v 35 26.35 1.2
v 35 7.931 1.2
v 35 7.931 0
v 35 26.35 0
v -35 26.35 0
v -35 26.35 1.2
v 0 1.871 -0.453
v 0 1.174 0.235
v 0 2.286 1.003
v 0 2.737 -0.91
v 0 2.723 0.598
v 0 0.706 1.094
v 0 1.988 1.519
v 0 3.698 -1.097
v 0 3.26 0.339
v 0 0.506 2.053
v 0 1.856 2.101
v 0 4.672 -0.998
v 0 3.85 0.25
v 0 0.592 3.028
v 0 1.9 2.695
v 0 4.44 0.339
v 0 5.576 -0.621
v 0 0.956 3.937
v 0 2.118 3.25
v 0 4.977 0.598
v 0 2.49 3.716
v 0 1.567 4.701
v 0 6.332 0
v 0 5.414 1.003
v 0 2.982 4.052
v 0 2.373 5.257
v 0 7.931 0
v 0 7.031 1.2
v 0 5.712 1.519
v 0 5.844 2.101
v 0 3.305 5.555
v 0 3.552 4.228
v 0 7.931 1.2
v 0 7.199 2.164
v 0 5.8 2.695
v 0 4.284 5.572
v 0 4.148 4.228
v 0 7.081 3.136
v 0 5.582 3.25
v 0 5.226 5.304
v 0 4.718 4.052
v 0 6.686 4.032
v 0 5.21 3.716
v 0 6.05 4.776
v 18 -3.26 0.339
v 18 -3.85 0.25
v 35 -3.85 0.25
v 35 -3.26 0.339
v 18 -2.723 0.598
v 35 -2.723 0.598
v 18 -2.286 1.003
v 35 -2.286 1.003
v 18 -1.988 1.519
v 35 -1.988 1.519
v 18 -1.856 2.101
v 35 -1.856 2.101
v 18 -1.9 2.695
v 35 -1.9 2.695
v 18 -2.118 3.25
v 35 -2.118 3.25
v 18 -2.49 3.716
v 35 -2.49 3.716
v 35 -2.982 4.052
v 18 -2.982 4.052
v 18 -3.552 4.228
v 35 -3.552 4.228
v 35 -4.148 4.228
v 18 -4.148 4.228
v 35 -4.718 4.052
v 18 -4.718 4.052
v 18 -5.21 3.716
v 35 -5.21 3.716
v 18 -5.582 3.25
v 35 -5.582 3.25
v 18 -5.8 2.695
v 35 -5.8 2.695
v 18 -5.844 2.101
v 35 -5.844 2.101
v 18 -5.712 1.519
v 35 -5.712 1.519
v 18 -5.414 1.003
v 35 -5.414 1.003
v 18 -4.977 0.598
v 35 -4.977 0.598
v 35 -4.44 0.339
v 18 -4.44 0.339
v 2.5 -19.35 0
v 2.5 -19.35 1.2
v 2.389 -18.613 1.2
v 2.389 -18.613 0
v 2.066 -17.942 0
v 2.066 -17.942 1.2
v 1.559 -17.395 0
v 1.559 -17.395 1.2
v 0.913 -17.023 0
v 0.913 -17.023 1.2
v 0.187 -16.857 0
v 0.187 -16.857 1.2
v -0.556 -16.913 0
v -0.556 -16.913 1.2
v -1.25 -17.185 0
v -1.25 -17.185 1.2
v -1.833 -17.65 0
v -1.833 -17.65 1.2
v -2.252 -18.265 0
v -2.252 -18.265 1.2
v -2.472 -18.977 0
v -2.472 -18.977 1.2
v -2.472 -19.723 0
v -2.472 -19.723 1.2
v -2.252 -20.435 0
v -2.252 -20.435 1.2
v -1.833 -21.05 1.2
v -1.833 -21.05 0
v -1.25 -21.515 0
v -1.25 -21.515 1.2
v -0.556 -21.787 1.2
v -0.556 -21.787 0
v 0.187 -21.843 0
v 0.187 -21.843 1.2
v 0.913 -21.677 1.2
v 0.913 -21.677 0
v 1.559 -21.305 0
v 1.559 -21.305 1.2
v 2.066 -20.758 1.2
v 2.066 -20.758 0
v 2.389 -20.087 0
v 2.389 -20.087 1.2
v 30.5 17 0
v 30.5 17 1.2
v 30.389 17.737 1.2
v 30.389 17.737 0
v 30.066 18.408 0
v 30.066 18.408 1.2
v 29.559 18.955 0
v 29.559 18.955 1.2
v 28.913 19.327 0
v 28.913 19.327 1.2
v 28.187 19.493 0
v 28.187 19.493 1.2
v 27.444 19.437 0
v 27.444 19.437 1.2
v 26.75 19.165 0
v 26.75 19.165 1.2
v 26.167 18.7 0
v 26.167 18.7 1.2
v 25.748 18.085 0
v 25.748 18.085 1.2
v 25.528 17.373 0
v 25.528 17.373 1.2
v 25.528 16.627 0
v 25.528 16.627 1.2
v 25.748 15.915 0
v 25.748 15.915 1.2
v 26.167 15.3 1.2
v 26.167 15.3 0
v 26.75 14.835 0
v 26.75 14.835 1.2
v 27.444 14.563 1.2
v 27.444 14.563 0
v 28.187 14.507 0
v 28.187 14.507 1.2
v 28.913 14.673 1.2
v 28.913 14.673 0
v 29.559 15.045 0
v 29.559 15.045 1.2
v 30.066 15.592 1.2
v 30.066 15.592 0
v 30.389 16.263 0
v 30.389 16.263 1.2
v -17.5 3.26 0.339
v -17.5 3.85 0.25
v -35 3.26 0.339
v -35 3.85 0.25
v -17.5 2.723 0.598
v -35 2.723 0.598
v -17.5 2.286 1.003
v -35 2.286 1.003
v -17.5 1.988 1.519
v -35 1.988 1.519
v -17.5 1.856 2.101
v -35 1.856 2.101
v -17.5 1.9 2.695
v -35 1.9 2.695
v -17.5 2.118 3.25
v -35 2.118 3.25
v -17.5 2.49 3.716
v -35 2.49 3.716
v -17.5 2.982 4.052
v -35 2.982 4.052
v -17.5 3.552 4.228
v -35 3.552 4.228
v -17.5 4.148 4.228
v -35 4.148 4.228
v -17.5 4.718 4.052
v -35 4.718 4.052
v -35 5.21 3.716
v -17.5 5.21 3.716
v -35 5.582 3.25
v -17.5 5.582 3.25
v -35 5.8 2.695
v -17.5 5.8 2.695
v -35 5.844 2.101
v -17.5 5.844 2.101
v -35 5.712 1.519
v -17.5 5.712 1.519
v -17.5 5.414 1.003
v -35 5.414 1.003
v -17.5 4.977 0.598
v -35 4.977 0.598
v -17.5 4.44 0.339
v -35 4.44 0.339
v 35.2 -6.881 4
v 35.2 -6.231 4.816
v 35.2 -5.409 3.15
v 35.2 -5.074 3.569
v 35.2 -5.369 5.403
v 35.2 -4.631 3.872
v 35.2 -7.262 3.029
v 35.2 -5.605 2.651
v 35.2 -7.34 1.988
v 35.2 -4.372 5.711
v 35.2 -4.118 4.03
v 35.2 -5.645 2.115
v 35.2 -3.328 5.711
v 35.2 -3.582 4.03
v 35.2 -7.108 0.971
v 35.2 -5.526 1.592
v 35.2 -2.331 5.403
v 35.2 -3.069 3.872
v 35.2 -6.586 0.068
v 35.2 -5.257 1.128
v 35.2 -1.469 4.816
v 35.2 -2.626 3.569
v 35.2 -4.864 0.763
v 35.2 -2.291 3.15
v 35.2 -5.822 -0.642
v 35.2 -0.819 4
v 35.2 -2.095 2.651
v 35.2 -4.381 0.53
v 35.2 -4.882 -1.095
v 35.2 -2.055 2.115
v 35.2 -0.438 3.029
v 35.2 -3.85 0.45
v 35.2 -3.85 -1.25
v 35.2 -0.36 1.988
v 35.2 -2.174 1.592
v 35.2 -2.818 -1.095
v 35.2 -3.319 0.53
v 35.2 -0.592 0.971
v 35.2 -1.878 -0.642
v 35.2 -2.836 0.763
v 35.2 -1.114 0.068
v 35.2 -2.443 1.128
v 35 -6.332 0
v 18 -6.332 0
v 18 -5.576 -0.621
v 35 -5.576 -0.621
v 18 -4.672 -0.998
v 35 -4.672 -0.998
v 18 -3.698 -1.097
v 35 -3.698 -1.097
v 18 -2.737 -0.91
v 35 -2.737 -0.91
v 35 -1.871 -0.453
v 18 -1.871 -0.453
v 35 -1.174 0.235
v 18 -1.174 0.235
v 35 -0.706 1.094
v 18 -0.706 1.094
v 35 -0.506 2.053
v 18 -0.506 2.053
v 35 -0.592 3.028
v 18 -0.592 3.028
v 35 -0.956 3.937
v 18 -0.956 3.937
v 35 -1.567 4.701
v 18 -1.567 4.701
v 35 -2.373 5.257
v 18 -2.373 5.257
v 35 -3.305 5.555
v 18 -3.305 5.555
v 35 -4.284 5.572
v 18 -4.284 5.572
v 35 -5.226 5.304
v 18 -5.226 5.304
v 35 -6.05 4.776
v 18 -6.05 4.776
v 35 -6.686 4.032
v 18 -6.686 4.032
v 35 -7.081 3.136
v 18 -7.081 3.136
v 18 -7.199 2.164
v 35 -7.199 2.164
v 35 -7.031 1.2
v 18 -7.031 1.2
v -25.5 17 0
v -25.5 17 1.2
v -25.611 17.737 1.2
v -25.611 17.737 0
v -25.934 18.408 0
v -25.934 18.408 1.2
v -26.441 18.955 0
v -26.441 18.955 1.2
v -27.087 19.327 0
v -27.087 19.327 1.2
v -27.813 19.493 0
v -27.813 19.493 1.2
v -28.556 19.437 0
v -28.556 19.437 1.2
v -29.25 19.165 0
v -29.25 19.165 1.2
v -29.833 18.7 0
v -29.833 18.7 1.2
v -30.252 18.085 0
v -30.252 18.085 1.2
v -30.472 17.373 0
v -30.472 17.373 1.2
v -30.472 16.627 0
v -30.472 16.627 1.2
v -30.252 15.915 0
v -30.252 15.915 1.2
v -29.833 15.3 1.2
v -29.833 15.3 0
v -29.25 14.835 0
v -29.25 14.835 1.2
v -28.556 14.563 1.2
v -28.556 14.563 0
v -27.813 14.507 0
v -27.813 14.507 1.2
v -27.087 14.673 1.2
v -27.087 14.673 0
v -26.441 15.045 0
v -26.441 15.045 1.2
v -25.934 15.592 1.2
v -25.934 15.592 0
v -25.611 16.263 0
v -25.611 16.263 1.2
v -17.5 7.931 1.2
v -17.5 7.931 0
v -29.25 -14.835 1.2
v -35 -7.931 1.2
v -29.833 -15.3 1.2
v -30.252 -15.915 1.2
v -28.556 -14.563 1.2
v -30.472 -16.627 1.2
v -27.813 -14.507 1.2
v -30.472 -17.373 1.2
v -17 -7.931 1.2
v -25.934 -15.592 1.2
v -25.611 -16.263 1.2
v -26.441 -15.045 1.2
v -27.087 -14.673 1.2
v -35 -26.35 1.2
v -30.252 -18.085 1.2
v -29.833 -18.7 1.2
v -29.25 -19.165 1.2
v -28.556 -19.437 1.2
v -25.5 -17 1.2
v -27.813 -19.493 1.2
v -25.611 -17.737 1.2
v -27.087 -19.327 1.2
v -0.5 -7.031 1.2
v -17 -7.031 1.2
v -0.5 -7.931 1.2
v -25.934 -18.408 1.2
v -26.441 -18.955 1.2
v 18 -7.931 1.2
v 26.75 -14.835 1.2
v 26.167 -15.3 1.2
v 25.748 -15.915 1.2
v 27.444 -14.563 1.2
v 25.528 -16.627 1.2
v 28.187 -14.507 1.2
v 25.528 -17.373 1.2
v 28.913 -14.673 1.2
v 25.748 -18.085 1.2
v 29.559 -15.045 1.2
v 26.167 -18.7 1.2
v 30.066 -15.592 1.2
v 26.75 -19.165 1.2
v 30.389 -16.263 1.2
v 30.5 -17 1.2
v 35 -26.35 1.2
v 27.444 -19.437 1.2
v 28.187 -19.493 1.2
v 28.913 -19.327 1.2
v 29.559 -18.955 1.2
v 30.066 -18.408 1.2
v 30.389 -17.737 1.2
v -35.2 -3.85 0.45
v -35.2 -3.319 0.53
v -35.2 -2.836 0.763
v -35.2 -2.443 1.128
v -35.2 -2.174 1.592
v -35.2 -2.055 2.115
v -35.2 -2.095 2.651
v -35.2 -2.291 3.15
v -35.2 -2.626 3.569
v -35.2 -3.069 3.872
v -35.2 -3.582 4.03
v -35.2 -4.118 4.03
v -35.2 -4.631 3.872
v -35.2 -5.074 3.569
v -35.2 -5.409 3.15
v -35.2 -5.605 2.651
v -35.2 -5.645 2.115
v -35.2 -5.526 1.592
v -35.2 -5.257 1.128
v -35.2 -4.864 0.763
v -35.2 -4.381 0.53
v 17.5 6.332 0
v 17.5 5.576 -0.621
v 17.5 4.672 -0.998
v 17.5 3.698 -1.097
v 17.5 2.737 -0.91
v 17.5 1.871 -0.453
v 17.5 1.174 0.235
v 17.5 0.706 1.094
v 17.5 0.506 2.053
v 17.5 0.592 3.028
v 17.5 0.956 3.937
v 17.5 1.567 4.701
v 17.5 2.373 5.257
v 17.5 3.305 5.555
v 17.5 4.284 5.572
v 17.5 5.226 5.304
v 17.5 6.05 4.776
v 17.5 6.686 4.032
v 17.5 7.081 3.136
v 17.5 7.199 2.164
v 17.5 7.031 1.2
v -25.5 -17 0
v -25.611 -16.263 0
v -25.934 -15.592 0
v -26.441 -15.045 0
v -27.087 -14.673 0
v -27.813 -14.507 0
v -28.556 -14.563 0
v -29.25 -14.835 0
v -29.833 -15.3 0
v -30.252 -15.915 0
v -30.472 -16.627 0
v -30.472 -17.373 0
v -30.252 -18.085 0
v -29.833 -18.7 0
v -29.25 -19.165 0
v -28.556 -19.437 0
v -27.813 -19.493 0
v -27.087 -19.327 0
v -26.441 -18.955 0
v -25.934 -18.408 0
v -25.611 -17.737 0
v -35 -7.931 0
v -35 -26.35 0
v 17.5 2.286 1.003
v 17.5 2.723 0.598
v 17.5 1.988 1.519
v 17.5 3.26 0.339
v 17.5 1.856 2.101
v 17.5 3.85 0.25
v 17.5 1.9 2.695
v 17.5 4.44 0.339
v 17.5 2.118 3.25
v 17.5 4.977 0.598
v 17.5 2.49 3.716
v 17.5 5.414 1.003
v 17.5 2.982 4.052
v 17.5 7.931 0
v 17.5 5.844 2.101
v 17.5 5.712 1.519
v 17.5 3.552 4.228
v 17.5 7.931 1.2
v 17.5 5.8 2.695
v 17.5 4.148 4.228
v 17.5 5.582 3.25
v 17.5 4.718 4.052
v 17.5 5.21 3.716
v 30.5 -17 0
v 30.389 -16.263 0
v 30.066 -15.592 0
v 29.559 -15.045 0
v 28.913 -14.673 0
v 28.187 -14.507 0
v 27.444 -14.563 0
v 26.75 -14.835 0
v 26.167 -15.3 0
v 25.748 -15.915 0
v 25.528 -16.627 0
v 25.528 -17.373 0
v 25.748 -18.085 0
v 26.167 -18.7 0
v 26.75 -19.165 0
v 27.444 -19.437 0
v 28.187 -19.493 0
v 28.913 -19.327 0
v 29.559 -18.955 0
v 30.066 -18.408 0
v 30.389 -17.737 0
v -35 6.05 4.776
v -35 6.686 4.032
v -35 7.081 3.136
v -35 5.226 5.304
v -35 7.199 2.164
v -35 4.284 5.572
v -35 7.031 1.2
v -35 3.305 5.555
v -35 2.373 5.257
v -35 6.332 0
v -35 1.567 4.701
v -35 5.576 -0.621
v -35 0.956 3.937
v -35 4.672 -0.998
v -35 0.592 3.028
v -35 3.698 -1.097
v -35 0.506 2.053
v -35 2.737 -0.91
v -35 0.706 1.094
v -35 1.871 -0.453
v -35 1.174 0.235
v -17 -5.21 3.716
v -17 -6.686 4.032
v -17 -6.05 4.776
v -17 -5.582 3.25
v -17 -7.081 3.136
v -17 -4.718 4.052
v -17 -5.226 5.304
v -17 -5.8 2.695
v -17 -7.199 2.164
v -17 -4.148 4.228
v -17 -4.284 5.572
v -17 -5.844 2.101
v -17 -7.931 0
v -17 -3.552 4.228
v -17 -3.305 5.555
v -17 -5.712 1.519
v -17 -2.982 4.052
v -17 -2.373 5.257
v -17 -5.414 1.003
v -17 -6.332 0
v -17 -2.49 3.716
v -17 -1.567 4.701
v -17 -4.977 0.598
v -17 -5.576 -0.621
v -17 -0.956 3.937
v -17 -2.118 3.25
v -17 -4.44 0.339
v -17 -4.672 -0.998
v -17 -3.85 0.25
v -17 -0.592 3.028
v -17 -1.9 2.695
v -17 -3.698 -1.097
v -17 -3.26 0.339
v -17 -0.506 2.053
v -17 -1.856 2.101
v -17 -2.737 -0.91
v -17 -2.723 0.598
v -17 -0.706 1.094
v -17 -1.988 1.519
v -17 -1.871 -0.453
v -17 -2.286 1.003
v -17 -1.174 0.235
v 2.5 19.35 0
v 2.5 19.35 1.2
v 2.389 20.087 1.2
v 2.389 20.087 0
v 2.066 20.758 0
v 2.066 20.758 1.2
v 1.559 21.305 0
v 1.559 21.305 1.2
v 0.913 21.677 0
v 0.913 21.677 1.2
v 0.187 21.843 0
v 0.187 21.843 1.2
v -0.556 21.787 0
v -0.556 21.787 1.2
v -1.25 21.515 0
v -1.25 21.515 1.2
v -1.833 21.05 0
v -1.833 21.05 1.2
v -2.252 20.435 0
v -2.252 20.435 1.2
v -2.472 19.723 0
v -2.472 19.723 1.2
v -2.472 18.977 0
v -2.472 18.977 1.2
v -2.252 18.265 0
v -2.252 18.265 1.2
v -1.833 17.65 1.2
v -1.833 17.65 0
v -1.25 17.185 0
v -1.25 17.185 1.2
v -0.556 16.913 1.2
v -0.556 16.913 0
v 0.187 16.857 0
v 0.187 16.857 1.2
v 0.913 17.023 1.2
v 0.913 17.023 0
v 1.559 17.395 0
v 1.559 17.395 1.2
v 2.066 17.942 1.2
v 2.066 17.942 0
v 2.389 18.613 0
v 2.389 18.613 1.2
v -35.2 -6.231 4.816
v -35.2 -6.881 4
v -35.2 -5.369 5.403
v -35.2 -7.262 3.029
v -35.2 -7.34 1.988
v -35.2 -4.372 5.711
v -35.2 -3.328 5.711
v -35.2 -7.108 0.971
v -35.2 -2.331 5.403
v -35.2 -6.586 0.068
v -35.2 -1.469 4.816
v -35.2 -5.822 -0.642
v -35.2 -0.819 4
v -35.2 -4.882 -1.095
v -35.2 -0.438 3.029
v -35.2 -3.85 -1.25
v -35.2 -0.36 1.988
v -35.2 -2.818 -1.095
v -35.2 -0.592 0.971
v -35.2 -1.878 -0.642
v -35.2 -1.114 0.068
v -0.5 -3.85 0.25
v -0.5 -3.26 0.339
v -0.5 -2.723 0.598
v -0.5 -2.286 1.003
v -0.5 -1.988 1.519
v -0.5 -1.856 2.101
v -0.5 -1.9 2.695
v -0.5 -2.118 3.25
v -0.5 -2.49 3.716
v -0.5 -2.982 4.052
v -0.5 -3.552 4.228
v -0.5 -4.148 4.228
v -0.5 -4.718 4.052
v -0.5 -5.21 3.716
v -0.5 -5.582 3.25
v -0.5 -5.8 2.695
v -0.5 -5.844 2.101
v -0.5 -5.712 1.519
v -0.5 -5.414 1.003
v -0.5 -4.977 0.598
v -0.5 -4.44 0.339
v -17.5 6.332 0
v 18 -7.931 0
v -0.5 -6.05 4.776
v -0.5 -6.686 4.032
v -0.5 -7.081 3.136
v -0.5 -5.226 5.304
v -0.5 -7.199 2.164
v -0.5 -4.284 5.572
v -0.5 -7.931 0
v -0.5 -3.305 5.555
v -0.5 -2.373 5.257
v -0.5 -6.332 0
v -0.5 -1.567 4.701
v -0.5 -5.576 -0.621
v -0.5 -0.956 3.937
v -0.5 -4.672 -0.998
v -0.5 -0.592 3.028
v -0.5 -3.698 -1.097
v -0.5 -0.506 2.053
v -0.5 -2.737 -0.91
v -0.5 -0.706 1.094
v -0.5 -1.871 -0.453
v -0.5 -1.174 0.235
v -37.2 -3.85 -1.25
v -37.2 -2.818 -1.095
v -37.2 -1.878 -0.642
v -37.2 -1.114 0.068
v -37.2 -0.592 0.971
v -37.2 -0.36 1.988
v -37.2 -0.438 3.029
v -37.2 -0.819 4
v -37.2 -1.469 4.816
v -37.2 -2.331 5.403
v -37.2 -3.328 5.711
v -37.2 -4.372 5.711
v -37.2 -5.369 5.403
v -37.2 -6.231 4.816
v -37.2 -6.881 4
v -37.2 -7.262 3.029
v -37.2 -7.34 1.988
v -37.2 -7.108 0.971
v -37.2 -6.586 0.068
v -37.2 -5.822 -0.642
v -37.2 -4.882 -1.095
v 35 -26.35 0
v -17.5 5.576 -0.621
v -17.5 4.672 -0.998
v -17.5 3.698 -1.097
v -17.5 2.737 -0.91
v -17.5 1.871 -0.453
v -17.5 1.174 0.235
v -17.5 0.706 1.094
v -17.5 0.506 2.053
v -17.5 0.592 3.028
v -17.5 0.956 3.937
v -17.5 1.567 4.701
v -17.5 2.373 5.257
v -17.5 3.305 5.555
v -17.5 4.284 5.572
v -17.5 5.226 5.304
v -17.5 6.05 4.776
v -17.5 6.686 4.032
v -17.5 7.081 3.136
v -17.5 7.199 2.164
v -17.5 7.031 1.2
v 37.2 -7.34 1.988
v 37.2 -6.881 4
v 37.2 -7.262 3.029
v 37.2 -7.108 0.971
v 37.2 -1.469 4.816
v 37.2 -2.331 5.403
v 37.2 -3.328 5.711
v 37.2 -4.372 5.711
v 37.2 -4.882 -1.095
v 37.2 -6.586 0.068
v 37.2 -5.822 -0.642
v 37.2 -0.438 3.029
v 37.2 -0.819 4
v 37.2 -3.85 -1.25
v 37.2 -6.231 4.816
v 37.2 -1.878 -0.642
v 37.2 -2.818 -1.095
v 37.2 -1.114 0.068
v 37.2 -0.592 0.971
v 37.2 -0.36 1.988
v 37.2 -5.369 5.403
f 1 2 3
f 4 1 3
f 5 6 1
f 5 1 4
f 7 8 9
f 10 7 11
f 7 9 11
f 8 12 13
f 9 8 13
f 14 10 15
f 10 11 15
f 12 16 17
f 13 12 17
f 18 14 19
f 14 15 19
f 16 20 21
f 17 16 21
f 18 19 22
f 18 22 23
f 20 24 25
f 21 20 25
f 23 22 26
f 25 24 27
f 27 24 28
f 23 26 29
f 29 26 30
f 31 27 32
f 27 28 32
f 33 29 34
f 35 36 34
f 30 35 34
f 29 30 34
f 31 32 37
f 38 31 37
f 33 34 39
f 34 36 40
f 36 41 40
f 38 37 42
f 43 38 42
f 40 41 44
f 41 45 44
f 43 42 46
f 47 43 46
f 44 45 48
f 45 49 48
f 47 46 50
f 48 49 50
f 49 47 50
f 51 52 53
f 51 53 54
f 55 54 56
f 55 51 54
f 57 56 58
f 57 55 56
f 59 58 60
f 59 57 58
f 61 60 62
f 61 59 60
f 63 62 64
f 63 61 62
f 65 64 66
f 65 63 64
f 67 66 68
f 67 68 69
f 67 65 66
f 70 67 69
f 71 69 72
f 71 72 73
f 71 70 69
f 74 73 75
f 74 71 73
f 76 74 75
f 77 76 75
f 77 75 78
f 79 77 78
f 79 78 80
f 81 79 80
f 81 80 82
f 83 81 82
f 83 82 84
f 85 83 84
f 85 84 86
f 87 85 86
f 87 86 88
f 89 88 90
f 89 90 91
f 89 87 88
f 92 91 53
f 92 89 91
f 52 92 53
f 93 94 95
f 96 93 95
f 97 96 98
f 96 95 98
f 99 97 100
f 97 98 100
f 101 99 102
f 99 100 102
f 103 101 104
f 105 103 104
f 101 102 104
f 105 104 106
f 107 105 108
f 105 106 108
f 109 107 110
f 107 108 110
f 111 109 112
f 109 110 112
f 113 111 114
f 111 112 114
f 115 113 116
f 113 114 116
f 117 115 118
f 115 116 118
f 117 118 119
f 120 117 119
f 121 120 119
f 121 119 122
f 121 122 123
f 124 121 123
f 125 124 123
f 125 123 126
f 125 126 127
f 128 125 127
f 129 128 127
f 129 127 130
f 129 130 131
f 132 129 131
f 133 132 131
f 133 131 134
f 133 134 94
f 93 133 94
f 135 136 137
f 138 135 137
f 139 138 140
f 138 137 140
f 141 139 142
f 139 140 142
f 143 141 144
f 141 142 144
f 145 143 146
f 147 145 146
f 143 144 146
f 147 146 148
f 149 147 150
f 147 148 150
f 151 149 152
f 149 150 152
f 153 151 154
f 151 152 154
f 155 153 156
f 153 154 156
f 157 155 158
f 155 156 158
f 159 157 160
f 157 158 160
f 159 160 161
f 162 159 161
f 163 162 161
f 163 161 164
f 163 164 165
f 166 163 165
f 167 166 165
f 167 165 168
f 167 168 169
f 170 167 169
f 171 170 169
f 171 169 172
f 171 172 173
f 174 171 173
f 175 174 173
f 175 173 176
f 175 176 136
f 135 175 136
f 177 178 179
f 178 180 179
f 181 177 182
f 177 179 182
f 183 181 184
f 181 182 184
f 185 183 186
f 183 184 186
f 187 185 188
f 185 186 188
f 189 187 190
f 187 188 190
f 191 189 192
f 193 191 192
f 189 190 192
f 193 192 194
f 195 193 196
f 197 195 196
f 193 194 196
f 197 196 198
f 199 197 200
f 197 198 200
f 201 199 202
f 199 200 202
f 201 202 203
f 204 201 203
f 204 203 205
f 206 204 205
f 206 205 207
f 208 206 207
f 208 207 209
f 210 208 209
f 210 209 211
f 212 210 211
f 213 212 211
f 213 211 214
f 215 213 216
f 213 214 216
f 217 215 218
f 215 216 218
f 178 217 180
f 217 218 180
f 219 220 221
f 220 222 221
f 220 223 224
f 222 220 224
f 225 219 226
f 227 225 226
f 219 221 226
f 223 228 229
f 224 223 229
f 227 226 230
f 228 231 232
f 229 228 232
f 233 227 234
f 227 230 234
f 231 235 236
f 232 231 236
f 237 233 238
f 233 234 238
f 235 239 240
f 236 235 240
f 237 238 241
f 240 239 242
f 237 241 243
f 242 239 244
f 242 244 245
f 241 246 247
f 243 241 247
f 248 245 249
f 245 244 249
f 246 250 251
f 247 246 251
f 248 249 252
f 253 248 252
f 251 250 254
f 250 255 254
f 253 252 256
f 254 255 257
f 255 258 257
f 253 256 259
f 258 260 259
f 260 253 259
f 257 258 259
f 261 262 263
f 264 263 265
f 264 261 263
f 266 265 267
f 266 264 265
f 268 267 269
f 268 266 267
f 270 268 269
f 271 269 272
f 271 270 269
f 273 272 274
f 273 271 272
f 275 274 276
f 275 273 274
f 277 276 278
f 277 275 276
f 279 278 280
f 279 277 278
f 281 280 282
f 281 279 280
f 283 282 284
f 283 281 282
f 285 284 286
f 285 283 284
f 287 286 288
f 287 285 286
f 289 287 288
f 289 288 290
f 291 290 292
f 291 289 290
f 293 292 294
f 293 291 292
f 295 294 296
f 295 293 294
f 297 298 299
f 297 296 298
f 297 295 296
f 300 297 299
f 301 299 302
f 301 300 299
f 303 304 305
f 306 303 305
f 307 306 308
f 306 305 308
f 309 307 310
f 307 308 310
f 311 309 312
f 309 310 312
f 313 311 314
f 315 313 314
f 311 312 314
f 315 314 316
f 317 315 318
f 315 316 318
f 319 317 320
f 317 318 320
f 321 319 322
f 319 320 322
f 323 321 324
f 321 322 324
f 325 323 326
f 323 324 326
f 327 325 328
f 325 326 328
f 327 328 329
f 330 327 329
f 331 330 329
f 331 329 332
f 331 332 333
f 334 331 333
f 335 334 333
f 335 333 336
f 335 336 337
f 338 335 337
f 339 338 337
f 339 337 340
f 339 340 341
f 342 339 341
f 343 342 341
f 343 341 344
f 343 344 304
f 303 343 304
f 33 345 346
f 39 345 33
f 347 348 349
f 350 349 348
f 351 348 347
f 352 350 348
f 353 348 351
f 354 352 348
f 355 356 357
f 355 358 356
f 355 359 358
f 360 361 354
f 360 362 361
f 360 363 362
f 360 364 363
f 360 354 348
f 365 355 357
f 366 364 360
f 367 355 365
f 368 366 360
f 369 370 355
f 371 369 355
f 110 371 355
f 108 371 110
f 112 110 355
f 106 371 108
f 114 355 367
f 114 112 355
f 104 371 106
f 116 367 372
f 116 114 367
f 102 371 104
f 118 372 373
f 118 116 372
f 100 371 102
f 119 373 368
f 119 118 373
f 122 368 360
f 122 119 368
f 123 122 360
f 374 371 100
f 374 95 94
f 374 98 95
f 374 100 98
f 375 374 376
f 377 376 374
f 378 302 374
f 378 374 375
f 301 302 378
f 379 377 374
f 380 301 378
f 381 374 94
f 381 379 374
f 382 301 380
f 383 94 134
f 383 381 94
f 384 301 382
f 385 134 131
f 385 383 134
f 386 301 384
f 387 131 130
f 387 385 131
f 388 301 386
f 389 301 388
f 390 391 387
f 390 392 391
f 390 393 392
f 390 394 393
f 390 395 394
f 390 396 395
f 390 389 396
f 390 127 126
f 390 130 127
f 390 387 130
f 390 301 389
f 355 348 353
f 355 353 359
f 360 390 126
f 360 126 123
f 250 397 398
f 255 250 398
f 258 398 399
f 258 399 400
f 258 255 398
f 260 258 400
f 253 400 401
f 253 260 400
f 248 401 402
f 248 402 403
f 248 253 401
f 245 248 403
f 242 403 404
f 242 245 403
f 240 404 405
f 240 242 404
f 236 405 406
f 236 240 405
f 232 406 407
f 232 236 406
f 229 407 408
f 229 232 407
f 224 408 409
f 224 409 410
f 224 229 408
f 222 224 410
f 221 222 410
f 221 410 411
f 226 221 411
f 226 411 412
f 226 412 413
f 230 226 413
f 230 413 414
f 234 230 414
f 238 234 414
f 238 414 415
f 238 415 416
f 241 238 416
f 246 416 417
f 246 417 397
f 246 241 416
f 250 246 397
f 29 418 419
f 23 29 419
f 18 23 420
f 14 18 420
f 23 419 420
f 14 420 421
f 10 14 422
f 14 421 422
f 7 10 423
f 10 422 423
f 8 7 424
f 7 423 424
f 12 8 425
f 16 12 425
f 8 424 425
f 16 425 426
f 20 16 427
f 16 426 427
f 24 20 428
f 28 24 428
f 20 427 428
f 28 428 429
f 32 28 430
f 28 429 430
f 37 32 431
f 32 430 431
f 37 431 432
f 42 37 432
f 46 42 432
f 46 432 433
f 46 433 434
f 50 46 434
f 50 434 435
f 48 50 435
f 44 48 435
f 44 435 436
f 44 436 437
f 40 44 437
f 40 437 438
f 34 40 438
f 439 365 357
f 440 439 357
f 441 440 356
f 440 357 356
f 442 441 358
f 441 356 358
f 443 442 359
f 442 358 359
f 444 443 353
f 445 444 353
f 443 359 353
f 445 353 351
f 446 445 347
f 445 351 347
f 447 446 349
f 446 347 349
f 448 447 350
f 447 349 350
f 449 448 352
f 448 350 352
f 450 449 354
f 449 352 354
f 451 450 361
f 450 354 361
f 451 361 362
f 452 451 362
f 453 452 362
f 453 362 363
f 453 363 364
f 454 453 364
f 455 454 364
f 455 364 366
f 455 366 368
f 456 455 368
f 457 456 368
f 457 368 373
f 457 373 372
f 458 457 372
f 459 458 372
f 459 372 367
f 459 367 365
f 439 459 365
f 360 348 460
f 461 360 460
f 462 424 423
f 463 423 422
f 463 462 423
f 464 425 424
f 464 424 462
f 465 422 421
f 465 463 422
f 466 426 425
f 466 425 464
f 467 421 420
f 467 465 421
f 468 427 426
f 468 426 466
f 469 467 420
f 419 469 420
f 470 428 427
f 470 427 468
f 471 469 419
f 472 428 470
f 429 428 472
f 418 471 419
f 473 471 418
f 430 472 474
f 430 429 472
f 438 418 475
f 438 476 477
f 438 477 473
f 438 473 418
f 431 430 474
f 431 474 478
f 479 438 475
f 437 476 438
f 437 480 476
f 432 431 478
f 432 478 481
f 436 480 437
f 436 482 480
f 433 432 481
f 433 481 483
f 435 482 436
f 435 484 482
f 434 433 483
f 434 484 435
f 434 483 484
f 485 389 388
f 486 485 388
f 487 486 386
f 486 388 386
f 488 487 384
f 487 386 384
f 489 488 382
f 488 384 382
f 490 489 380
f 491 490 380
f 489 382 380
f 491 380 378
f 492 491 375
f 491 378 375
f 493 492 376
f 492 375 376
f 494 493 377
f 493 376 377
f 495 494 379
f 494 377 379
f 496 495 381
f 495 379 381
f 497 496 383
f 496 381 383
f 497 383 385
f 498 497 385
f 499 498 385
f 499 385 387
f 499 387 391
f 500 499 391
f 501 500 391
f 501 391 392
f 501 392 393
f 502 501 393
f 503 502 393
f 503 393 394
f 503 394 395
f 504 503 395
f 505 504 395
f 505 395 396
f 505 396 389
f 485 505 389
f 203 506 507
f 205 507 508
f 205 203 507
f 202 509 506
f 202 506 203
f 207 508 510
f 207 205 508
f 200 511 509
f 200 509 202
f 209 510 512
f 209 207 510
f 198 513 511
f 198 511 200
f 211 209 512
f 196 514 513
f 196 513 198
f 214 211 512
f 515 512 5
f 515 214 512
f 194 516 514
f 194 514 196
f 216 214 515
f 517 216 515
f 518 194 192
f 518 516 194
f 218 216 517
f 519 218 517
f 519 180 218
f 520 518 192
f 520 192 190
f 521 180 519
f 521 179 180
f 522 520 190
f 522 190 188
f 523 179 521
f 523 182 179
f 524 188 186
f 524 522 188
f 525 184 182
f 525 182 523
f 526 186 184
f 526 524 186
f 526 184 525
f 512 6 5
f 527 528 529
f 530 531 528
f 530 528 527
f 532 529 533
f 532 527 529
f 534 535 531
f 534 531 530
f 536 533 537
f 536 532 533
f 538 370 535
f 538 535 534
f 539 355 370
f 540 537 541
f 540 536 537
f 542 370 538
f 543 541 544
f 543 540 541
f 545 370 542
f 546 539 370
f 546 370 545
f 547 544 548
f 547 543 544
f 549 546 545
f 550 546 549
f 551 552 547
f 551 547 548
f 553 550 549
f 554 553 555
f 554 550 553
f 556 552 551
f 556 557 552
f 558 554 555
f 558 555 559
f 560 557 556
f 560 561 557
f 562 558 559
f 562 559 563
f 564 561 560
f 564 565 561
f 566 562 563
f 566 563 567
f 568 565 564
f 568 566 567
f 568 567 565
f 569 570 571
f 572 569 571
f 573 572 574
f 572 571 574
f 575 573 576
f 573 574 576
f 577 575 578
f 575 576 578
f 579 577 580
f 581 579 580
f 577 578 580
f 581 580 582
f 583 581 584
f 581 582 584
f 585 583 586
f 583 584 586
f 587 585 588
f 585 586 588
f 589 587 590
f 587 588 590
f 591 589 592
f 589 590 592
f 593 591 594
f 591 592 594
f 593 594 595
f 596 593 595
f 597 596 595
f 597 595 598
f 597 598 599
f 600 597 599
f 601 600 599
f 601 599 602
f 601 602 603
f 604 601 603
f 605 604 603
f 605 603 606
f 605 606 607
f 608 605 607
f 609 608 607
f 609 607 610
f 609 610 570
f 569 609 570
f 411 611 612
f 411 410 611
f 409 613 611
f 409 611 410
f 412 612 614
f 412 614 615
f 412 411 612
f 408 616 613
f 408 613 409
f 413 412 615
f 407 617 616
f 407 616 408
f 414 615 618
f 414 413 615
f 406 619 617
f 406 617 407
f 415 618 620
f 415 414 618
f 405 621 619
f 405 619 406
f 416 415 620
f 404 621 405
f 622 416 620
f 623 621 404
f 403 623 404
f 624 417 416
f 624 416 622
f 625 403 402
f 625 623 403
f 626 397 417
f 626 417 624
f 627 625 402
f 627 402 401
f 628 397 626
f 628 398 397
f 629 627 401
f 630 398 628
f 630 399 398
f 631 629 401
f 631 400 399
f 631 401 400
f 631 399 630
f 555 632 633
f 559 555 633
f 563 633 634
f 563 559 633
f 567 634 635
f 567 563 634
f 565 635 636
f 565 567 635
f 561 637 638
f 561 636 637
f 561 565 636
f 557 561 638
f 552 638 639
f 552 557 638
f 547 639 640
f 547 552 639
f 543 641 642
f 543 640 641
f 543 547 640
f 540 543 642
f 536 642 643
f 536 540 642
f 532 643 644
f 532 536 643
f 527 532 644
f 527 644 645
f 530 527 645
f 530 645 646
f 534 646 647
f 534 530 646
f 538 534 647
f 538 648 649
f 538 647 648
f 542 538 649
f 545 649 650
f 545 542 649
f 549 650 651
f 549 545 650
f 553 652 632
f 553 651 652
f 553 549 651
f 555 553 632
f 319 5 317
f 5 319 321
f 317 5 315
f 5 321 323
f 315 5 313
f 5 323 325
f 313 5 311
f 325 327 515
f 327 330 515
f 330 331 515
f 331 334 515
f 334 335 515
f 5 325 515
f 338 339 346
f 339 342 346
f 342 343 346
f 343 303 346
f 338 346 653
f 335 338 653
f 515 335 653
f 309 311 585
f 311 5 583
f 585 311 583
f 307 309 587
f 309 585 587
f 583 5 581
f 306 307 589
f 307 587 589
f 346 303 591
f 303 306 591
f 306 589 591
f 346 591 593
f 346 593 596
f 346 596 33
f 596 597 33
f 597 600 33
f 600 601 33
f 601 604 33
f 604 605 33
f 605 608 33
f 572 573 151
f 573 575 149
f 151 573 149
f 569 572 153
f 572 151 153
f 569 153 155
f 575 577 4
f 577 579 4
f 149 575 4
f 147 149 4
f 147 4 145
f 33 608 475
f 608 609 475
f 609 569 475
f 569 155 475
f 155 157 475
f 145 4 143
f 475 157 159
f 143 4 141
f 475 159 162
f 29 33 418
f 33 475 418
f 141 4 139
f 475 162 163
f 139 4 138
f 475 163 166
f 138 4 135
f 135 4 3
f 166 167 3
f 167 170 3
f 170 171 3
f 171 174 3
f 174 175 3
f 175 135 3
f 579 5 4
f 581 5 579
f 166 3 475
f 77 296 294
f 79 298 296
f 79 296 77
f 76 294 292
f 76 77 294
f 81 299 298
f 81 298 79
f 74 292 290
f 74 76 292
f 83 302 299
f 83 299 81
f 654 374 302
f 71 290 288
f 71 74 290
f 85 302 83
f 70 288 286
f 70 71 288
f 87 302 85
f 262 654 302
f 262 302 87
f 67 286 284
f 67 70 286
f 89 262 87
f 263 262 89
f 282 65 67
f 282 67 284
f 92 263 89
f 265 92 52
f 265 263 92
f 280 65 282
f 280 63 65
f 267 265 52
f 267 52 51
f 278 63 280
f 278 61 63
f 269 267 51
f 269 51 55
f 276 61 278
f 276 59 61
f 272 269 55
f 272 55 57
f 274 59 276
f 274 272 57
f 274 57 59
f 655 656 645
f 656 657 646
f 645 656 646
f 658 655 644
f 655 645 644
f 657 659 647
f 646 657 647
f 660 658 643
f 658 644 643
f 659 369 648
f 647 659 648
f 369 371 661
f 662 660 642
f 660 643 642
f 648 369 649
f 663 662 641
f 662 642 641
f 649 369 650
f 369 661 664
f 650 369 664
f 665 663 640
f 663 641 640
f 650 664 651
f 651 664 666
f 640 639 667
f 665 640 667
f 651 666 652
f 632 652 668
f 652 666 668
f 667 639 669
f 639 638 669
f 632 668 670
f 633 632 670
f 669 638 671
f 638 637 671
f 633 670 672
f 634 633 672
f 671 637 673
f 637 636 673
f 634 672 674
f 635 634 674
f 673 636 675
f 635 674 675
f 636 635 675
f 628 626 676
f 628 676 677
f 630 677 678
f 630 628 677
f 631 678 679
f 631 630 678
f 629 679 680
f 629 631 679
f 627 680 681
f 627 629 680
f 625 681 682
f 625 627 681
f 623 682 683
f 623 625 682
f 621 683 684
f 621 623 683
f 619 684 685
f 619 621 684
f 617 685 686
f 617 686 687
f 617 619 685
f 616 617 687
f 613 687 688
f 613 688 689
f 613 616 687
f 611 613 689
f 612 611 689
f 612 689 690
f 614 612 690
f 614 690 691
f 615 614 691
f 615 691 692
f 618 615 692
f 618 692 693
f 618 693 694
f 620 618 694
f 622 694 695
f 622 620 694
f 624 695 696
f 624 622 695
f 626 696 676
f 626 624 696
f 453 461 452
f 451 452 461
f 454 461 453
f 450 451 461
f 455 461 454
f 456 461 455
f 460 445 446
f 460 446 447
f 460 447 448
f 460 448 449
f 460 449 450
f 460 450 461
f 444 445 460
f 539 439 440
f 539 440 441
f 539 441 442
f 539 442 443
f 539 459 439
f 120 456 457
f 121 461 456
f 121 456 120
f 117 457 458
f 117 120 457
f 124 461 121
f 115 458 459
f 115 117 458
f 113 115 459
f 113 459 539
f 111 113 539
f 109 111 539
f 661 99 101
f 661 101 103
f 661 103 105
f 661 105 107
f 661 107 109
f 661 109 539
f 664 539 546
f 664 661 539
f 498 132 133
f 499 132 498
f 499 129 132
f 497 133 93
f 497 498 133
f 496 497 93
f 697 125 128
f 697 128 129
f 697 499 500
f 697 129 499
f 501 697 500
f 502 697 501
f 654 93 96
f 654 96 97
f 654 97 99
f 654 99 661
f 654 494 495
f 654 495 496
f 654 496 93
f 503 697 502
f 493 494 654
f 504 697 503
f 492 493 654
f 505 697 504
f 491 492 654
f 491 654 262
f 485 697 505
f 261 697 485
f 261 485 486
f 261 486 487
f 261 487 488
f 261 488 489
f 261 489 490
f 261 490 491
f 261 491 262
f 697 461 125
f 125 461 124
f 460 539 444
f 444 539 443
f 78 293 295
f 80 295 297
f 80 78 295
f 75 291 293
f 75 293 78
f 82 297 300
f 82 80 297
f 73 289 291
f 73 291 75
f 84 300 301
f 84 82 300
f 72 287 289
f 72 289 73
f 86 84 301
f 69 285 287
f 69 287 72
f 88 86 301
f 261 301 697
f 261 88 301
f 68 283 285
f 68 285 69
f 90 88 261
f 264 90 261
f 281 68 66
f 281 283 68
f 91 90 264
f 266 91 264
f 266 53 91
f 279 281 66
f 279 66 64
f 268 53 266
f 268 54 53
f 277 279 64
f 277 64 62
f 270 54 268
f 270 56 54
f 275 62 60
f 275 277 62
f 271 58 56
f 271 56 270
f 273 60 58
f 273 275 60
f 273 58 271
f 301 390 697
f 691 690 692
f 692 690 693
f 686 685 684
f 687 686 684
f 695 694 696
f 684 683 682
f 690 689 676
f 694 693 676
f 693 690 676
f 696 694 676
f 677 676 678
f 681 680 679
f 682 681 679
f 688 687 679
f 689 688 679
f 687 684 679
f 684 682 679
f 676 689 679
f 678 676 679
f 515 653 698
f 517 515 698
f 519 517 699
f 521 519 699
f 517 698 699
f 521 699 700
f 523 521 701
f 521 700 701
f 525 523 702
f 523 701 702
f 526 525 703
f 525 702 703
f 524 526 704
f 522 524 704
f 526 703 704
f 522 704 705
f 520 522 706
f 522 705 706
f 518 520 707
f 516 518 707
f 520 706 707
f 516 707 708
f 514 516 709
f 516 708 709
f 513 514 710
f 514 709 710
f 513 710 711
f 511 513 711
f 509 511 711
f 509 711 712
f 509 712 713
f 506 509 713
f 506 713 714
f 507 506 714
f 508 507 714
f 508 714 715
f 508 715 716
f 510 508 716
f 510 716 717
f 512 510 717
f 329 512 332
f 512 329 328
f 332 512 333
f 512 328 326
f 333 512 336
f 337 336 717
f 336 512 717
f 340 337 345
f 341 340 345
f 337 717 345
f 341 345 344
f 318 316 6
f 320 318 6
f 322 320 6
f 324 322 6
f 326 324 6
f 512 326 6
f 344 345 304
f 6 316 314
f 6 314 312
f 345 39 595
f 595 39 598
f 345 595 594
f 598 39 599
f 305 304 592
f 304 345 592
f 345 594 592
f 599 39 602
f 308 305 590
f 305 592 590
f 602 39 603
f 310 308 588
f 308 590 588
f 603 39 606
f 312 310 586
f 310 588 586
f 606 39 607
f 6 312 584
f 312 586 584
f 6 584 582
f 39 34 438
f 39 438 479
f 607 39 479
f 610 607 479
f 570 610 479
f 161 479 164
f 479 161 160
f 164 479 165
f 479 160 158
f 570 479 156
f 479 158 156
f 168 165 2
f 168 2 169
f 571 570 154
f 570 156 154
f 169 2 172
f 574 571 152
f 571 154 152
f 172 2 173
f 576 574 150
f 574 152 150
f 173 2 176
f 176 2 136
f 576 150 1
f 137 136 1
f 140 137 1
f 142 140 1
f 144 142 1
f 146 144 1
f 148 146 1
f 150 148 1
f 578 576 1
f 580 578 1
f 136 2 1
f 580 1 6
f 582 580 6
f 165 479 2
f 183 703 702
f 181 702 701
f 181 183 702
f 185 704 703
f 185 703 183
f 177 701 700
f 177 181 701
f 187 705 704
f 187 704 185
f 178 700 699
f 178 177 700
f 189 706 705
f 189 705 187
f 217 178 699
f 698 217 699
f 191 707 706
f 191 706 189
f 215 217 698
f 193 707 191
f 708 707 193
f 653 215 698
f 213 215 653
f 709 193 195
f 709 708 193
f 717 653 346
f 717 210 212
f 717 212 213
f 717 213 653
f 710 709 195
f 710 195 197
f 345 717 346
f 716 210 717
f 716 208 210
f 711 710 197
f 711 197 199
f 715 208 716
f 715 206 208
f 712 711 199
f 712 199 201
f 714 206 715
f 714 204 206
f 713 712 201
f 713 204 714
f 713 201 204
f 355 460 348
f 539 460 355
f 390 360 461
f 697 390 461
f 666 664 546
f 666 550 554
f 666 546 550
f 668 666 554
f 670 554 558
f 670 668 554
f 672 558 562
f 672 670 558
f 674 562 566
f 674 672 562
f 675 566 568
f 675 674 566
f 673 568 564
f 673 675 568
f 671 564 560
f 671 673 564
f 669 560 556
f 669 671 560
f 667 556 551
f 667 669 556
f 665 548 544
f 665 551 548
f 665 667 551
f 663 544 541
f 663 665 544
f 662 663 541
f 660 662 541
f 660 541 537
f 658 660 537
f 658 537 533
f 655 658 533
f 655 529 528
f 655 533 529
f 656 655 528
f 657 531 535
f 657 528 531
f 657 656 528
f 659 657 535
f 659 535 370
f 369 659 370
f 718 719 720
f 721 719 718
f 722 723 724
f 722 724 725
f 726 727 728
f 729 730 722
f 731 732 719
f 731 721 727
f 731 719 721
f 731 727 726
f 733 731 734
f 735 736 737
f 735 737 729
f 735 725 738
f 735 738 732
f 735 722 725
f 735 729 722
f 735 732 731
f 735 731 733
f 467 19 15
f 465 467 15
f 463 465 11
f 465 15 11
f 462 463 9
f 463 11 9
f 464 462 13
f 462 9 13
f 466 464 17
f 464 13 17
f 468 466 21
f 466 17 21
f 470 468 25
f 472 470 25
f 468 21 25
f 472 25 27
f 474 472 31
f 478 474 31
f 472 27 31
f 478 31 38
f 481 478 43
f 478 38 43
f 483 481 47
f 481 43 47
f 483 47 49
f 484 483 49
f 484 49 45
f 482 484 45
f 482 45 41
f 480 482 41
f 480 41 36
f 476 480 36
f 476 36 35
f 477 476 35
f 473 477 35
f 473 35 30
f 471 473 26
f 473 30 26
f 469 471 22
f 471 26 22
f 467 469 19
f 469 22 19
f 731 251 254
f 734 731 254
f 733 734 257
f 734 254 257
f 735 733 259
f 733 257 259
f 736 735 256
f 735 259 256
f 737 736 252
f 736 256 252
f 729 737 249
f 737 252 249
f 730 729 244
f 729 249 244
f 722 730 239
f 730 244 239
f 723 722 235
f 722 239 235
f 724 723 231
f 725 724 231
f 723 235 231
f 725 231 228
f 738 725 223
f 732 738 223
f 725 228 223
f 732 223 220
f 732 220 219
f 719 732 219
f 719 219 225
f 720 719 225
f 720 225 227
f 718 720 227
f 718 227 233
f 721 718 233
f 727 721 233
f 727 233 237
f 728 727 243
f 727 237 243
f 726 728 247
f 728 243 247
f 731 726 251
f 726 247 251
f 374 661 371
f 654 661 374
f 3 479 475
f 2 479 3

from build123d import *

# Parameters (mm, degrees)
SKETCH1_R           = 2
BOSS_EXTRUDE1_DEPTH = 35
BOSS_EXTRUDE2_START = 0.2
SKETCH2_R           = 1.8
BOSS_EXTRUDE2_DEPTH = 70.4
SKETCH3_R           = 3.5
BOSS_EXTRUDE3_DEPTH = 2
SKETCH4_W           = 18.5
SKETCH4_H           = 7.431194744
SKETCH4_W_2         = 17.5
CUT_EXTRUDE1_DEPTH  = 46.948068512
LPATTERN1_COUNT     = 2
LPATTERN1_PITCH     = 35
SKETCH5_R           = 2.5
CUT_EXTRUDE2_DEPTH  = 46.813371411


with BuildPart() as part:
    # Sketch1 → Boss-Extrude1 (new, symmetric)
    with BuildSketch(Plane(origin=(0, 0, 0), x_dir=(0, 0, -1), z_dir=(1, 0, 0))):
        with BuildLine():
            Line((-1.2, -7.031194744), (-1.2, -26.35))
            Line((-1.2, -26.35), (0, -26.35))
            Line((0, -26.35), (0, -6.331934729))
            ThreePointArc((0, -6.331934729), (-3.936636043, -0.955564156), (-1.2, -7.031194744))
        make_face()
        with Locations((-2.25, -3.85)):
            Circle(SKETCH1_R, mode=Mode.SUBTRACT)
    extrude(amount=BOSS_EXTRUDE1_DEPTH, both=True)


with BuildPart() as body_2:
    # Sketch2 → Boss-Extrude2 (new body)
    with BuildSketch(Plane(origin=(35, 0, 0), x_dir=(0, 0, -1), z_dir=(1, 0, 0)).offset(BOSS_EXTRUDE2_START)):
        with Locations((-2.25, -3.85)):
            Circle(SKETCH2_R)
    extrude(amount=-BOSS_EXTRUDE2_DEPTH)

    # Sketch3 → Boss-Extrude3 (add)
    with BuildSketch(Plane(origin=(35.2, 0, 0), x_dir=(0, 0, -1), z_dir=(1, 0, 0))):
        with Locations((-2.25, -3.85)):
            Circle(SKETCH3_R)
    boss_extrude3 = extrude(amount=BOSS_EXTRUDE3_DEPTH)

    # Mirror1: Boss-Extrude3 across plane
    add(boss_extrude3.mirror(Plane(origin=(0, 0, 0), x_dir=(0, 0, 1), z_dir=(1, 0, 0))))


with BuildPart() as body_3:
    # Mirror2: mirrored copy
    add(part.part.mirror(Plane.ZX))


with BuildPart() as cut_extrude1_tool:
    # Sketch4 → Cut-Extrude1 (new, symmetric)
    with BuildSketch(Plane.XY):
        with Locations((8.75, -4.215597372)):
            Rectangle(SKETCH4_W, SKETCH4_H)
        with Locations((26.25, 4.215597372)):
            Rectangle(SKETCH4_W_2, SKETCH4_H)
    cut_extrude1 = extrude(amount=CUT_EXTRUDE1_DEPTH, both=True)


with BuildPart() as part_1:
    add(part.part)

    # Cut-Extrude1: cut by cut_extrude1_tool
    add(cut_extrude1_tool.part, mode=Mode.SUBTRACT)


with BuildPart() as body_3_1:
    add(body_3.part)

    # Cut-Extrude1: cut by cut_extrude1_tool
    add(cut_extrude1_tool.part, mode=Mode.SUBTRACT)


with BuildPart() as lpattern1_tool:
    # LPattern1: Cut-Extrude1 ×2
    with Locations(*[(-i * LPATTERN1_PITCH, 0, 0) for i in range(1, LPATTERN1_COUNT)]):
        add(cut_extrude1)


with BuildPart() as part_2:
    add(part_1.part)

    # LPattern1: cut by lpattern1_tool
    add(lpattern1_tool.part, mode=Mode.SUBTRACT)


with BuildPart() as body_3_2:
    add(body_3_1.part)

    # LPattern1: cut by lpattern1_tool
    add(lpattern1_tool.part, mode=Mode.SUBTRACT)


with BuildPart() as cut_extrude2_tool:
    # Sketch5 → Cut-Extrude2 (new, through all)
    with BuildSketch(Plane.XY.offset(1.2)):
        with Locations((-28, -17)):
            Circle(SKETCH5_R)
        with Locations((28, -17)):
            Circle(SKETCH5_R)
        with Locations((0, -19.35)):
            Circle(SKETCH5_R)
        with Locations((0, 19.35)):
            Circle(SKETCH5_R)
        with Locations((28, 17)):
            Circle(SKETCH5_R)
        with Locations((-28, 17)):
            Circle(SKETCH5_R)
    extrude(amount=-CUT_EXTRUDE2_DEPTH)


with BuildPart() as part_3:
    add(part_2.part)

    # Cut-Extrude2: cut by cut_extrude2_tool
    add(cut_extrude2_tool.part, mode=Mode.SUBTRACT)


with BuildPart() as body_3_3:
    add(body_3_2.part)

    # Cut-Extrude2: cut by cut_extrude2_tool
    add(cut_extrude2_tool.part, mode=Mode.SUBTRACT)


solid = Compound([body_2.part, part_3.part, body_3_3.part])
